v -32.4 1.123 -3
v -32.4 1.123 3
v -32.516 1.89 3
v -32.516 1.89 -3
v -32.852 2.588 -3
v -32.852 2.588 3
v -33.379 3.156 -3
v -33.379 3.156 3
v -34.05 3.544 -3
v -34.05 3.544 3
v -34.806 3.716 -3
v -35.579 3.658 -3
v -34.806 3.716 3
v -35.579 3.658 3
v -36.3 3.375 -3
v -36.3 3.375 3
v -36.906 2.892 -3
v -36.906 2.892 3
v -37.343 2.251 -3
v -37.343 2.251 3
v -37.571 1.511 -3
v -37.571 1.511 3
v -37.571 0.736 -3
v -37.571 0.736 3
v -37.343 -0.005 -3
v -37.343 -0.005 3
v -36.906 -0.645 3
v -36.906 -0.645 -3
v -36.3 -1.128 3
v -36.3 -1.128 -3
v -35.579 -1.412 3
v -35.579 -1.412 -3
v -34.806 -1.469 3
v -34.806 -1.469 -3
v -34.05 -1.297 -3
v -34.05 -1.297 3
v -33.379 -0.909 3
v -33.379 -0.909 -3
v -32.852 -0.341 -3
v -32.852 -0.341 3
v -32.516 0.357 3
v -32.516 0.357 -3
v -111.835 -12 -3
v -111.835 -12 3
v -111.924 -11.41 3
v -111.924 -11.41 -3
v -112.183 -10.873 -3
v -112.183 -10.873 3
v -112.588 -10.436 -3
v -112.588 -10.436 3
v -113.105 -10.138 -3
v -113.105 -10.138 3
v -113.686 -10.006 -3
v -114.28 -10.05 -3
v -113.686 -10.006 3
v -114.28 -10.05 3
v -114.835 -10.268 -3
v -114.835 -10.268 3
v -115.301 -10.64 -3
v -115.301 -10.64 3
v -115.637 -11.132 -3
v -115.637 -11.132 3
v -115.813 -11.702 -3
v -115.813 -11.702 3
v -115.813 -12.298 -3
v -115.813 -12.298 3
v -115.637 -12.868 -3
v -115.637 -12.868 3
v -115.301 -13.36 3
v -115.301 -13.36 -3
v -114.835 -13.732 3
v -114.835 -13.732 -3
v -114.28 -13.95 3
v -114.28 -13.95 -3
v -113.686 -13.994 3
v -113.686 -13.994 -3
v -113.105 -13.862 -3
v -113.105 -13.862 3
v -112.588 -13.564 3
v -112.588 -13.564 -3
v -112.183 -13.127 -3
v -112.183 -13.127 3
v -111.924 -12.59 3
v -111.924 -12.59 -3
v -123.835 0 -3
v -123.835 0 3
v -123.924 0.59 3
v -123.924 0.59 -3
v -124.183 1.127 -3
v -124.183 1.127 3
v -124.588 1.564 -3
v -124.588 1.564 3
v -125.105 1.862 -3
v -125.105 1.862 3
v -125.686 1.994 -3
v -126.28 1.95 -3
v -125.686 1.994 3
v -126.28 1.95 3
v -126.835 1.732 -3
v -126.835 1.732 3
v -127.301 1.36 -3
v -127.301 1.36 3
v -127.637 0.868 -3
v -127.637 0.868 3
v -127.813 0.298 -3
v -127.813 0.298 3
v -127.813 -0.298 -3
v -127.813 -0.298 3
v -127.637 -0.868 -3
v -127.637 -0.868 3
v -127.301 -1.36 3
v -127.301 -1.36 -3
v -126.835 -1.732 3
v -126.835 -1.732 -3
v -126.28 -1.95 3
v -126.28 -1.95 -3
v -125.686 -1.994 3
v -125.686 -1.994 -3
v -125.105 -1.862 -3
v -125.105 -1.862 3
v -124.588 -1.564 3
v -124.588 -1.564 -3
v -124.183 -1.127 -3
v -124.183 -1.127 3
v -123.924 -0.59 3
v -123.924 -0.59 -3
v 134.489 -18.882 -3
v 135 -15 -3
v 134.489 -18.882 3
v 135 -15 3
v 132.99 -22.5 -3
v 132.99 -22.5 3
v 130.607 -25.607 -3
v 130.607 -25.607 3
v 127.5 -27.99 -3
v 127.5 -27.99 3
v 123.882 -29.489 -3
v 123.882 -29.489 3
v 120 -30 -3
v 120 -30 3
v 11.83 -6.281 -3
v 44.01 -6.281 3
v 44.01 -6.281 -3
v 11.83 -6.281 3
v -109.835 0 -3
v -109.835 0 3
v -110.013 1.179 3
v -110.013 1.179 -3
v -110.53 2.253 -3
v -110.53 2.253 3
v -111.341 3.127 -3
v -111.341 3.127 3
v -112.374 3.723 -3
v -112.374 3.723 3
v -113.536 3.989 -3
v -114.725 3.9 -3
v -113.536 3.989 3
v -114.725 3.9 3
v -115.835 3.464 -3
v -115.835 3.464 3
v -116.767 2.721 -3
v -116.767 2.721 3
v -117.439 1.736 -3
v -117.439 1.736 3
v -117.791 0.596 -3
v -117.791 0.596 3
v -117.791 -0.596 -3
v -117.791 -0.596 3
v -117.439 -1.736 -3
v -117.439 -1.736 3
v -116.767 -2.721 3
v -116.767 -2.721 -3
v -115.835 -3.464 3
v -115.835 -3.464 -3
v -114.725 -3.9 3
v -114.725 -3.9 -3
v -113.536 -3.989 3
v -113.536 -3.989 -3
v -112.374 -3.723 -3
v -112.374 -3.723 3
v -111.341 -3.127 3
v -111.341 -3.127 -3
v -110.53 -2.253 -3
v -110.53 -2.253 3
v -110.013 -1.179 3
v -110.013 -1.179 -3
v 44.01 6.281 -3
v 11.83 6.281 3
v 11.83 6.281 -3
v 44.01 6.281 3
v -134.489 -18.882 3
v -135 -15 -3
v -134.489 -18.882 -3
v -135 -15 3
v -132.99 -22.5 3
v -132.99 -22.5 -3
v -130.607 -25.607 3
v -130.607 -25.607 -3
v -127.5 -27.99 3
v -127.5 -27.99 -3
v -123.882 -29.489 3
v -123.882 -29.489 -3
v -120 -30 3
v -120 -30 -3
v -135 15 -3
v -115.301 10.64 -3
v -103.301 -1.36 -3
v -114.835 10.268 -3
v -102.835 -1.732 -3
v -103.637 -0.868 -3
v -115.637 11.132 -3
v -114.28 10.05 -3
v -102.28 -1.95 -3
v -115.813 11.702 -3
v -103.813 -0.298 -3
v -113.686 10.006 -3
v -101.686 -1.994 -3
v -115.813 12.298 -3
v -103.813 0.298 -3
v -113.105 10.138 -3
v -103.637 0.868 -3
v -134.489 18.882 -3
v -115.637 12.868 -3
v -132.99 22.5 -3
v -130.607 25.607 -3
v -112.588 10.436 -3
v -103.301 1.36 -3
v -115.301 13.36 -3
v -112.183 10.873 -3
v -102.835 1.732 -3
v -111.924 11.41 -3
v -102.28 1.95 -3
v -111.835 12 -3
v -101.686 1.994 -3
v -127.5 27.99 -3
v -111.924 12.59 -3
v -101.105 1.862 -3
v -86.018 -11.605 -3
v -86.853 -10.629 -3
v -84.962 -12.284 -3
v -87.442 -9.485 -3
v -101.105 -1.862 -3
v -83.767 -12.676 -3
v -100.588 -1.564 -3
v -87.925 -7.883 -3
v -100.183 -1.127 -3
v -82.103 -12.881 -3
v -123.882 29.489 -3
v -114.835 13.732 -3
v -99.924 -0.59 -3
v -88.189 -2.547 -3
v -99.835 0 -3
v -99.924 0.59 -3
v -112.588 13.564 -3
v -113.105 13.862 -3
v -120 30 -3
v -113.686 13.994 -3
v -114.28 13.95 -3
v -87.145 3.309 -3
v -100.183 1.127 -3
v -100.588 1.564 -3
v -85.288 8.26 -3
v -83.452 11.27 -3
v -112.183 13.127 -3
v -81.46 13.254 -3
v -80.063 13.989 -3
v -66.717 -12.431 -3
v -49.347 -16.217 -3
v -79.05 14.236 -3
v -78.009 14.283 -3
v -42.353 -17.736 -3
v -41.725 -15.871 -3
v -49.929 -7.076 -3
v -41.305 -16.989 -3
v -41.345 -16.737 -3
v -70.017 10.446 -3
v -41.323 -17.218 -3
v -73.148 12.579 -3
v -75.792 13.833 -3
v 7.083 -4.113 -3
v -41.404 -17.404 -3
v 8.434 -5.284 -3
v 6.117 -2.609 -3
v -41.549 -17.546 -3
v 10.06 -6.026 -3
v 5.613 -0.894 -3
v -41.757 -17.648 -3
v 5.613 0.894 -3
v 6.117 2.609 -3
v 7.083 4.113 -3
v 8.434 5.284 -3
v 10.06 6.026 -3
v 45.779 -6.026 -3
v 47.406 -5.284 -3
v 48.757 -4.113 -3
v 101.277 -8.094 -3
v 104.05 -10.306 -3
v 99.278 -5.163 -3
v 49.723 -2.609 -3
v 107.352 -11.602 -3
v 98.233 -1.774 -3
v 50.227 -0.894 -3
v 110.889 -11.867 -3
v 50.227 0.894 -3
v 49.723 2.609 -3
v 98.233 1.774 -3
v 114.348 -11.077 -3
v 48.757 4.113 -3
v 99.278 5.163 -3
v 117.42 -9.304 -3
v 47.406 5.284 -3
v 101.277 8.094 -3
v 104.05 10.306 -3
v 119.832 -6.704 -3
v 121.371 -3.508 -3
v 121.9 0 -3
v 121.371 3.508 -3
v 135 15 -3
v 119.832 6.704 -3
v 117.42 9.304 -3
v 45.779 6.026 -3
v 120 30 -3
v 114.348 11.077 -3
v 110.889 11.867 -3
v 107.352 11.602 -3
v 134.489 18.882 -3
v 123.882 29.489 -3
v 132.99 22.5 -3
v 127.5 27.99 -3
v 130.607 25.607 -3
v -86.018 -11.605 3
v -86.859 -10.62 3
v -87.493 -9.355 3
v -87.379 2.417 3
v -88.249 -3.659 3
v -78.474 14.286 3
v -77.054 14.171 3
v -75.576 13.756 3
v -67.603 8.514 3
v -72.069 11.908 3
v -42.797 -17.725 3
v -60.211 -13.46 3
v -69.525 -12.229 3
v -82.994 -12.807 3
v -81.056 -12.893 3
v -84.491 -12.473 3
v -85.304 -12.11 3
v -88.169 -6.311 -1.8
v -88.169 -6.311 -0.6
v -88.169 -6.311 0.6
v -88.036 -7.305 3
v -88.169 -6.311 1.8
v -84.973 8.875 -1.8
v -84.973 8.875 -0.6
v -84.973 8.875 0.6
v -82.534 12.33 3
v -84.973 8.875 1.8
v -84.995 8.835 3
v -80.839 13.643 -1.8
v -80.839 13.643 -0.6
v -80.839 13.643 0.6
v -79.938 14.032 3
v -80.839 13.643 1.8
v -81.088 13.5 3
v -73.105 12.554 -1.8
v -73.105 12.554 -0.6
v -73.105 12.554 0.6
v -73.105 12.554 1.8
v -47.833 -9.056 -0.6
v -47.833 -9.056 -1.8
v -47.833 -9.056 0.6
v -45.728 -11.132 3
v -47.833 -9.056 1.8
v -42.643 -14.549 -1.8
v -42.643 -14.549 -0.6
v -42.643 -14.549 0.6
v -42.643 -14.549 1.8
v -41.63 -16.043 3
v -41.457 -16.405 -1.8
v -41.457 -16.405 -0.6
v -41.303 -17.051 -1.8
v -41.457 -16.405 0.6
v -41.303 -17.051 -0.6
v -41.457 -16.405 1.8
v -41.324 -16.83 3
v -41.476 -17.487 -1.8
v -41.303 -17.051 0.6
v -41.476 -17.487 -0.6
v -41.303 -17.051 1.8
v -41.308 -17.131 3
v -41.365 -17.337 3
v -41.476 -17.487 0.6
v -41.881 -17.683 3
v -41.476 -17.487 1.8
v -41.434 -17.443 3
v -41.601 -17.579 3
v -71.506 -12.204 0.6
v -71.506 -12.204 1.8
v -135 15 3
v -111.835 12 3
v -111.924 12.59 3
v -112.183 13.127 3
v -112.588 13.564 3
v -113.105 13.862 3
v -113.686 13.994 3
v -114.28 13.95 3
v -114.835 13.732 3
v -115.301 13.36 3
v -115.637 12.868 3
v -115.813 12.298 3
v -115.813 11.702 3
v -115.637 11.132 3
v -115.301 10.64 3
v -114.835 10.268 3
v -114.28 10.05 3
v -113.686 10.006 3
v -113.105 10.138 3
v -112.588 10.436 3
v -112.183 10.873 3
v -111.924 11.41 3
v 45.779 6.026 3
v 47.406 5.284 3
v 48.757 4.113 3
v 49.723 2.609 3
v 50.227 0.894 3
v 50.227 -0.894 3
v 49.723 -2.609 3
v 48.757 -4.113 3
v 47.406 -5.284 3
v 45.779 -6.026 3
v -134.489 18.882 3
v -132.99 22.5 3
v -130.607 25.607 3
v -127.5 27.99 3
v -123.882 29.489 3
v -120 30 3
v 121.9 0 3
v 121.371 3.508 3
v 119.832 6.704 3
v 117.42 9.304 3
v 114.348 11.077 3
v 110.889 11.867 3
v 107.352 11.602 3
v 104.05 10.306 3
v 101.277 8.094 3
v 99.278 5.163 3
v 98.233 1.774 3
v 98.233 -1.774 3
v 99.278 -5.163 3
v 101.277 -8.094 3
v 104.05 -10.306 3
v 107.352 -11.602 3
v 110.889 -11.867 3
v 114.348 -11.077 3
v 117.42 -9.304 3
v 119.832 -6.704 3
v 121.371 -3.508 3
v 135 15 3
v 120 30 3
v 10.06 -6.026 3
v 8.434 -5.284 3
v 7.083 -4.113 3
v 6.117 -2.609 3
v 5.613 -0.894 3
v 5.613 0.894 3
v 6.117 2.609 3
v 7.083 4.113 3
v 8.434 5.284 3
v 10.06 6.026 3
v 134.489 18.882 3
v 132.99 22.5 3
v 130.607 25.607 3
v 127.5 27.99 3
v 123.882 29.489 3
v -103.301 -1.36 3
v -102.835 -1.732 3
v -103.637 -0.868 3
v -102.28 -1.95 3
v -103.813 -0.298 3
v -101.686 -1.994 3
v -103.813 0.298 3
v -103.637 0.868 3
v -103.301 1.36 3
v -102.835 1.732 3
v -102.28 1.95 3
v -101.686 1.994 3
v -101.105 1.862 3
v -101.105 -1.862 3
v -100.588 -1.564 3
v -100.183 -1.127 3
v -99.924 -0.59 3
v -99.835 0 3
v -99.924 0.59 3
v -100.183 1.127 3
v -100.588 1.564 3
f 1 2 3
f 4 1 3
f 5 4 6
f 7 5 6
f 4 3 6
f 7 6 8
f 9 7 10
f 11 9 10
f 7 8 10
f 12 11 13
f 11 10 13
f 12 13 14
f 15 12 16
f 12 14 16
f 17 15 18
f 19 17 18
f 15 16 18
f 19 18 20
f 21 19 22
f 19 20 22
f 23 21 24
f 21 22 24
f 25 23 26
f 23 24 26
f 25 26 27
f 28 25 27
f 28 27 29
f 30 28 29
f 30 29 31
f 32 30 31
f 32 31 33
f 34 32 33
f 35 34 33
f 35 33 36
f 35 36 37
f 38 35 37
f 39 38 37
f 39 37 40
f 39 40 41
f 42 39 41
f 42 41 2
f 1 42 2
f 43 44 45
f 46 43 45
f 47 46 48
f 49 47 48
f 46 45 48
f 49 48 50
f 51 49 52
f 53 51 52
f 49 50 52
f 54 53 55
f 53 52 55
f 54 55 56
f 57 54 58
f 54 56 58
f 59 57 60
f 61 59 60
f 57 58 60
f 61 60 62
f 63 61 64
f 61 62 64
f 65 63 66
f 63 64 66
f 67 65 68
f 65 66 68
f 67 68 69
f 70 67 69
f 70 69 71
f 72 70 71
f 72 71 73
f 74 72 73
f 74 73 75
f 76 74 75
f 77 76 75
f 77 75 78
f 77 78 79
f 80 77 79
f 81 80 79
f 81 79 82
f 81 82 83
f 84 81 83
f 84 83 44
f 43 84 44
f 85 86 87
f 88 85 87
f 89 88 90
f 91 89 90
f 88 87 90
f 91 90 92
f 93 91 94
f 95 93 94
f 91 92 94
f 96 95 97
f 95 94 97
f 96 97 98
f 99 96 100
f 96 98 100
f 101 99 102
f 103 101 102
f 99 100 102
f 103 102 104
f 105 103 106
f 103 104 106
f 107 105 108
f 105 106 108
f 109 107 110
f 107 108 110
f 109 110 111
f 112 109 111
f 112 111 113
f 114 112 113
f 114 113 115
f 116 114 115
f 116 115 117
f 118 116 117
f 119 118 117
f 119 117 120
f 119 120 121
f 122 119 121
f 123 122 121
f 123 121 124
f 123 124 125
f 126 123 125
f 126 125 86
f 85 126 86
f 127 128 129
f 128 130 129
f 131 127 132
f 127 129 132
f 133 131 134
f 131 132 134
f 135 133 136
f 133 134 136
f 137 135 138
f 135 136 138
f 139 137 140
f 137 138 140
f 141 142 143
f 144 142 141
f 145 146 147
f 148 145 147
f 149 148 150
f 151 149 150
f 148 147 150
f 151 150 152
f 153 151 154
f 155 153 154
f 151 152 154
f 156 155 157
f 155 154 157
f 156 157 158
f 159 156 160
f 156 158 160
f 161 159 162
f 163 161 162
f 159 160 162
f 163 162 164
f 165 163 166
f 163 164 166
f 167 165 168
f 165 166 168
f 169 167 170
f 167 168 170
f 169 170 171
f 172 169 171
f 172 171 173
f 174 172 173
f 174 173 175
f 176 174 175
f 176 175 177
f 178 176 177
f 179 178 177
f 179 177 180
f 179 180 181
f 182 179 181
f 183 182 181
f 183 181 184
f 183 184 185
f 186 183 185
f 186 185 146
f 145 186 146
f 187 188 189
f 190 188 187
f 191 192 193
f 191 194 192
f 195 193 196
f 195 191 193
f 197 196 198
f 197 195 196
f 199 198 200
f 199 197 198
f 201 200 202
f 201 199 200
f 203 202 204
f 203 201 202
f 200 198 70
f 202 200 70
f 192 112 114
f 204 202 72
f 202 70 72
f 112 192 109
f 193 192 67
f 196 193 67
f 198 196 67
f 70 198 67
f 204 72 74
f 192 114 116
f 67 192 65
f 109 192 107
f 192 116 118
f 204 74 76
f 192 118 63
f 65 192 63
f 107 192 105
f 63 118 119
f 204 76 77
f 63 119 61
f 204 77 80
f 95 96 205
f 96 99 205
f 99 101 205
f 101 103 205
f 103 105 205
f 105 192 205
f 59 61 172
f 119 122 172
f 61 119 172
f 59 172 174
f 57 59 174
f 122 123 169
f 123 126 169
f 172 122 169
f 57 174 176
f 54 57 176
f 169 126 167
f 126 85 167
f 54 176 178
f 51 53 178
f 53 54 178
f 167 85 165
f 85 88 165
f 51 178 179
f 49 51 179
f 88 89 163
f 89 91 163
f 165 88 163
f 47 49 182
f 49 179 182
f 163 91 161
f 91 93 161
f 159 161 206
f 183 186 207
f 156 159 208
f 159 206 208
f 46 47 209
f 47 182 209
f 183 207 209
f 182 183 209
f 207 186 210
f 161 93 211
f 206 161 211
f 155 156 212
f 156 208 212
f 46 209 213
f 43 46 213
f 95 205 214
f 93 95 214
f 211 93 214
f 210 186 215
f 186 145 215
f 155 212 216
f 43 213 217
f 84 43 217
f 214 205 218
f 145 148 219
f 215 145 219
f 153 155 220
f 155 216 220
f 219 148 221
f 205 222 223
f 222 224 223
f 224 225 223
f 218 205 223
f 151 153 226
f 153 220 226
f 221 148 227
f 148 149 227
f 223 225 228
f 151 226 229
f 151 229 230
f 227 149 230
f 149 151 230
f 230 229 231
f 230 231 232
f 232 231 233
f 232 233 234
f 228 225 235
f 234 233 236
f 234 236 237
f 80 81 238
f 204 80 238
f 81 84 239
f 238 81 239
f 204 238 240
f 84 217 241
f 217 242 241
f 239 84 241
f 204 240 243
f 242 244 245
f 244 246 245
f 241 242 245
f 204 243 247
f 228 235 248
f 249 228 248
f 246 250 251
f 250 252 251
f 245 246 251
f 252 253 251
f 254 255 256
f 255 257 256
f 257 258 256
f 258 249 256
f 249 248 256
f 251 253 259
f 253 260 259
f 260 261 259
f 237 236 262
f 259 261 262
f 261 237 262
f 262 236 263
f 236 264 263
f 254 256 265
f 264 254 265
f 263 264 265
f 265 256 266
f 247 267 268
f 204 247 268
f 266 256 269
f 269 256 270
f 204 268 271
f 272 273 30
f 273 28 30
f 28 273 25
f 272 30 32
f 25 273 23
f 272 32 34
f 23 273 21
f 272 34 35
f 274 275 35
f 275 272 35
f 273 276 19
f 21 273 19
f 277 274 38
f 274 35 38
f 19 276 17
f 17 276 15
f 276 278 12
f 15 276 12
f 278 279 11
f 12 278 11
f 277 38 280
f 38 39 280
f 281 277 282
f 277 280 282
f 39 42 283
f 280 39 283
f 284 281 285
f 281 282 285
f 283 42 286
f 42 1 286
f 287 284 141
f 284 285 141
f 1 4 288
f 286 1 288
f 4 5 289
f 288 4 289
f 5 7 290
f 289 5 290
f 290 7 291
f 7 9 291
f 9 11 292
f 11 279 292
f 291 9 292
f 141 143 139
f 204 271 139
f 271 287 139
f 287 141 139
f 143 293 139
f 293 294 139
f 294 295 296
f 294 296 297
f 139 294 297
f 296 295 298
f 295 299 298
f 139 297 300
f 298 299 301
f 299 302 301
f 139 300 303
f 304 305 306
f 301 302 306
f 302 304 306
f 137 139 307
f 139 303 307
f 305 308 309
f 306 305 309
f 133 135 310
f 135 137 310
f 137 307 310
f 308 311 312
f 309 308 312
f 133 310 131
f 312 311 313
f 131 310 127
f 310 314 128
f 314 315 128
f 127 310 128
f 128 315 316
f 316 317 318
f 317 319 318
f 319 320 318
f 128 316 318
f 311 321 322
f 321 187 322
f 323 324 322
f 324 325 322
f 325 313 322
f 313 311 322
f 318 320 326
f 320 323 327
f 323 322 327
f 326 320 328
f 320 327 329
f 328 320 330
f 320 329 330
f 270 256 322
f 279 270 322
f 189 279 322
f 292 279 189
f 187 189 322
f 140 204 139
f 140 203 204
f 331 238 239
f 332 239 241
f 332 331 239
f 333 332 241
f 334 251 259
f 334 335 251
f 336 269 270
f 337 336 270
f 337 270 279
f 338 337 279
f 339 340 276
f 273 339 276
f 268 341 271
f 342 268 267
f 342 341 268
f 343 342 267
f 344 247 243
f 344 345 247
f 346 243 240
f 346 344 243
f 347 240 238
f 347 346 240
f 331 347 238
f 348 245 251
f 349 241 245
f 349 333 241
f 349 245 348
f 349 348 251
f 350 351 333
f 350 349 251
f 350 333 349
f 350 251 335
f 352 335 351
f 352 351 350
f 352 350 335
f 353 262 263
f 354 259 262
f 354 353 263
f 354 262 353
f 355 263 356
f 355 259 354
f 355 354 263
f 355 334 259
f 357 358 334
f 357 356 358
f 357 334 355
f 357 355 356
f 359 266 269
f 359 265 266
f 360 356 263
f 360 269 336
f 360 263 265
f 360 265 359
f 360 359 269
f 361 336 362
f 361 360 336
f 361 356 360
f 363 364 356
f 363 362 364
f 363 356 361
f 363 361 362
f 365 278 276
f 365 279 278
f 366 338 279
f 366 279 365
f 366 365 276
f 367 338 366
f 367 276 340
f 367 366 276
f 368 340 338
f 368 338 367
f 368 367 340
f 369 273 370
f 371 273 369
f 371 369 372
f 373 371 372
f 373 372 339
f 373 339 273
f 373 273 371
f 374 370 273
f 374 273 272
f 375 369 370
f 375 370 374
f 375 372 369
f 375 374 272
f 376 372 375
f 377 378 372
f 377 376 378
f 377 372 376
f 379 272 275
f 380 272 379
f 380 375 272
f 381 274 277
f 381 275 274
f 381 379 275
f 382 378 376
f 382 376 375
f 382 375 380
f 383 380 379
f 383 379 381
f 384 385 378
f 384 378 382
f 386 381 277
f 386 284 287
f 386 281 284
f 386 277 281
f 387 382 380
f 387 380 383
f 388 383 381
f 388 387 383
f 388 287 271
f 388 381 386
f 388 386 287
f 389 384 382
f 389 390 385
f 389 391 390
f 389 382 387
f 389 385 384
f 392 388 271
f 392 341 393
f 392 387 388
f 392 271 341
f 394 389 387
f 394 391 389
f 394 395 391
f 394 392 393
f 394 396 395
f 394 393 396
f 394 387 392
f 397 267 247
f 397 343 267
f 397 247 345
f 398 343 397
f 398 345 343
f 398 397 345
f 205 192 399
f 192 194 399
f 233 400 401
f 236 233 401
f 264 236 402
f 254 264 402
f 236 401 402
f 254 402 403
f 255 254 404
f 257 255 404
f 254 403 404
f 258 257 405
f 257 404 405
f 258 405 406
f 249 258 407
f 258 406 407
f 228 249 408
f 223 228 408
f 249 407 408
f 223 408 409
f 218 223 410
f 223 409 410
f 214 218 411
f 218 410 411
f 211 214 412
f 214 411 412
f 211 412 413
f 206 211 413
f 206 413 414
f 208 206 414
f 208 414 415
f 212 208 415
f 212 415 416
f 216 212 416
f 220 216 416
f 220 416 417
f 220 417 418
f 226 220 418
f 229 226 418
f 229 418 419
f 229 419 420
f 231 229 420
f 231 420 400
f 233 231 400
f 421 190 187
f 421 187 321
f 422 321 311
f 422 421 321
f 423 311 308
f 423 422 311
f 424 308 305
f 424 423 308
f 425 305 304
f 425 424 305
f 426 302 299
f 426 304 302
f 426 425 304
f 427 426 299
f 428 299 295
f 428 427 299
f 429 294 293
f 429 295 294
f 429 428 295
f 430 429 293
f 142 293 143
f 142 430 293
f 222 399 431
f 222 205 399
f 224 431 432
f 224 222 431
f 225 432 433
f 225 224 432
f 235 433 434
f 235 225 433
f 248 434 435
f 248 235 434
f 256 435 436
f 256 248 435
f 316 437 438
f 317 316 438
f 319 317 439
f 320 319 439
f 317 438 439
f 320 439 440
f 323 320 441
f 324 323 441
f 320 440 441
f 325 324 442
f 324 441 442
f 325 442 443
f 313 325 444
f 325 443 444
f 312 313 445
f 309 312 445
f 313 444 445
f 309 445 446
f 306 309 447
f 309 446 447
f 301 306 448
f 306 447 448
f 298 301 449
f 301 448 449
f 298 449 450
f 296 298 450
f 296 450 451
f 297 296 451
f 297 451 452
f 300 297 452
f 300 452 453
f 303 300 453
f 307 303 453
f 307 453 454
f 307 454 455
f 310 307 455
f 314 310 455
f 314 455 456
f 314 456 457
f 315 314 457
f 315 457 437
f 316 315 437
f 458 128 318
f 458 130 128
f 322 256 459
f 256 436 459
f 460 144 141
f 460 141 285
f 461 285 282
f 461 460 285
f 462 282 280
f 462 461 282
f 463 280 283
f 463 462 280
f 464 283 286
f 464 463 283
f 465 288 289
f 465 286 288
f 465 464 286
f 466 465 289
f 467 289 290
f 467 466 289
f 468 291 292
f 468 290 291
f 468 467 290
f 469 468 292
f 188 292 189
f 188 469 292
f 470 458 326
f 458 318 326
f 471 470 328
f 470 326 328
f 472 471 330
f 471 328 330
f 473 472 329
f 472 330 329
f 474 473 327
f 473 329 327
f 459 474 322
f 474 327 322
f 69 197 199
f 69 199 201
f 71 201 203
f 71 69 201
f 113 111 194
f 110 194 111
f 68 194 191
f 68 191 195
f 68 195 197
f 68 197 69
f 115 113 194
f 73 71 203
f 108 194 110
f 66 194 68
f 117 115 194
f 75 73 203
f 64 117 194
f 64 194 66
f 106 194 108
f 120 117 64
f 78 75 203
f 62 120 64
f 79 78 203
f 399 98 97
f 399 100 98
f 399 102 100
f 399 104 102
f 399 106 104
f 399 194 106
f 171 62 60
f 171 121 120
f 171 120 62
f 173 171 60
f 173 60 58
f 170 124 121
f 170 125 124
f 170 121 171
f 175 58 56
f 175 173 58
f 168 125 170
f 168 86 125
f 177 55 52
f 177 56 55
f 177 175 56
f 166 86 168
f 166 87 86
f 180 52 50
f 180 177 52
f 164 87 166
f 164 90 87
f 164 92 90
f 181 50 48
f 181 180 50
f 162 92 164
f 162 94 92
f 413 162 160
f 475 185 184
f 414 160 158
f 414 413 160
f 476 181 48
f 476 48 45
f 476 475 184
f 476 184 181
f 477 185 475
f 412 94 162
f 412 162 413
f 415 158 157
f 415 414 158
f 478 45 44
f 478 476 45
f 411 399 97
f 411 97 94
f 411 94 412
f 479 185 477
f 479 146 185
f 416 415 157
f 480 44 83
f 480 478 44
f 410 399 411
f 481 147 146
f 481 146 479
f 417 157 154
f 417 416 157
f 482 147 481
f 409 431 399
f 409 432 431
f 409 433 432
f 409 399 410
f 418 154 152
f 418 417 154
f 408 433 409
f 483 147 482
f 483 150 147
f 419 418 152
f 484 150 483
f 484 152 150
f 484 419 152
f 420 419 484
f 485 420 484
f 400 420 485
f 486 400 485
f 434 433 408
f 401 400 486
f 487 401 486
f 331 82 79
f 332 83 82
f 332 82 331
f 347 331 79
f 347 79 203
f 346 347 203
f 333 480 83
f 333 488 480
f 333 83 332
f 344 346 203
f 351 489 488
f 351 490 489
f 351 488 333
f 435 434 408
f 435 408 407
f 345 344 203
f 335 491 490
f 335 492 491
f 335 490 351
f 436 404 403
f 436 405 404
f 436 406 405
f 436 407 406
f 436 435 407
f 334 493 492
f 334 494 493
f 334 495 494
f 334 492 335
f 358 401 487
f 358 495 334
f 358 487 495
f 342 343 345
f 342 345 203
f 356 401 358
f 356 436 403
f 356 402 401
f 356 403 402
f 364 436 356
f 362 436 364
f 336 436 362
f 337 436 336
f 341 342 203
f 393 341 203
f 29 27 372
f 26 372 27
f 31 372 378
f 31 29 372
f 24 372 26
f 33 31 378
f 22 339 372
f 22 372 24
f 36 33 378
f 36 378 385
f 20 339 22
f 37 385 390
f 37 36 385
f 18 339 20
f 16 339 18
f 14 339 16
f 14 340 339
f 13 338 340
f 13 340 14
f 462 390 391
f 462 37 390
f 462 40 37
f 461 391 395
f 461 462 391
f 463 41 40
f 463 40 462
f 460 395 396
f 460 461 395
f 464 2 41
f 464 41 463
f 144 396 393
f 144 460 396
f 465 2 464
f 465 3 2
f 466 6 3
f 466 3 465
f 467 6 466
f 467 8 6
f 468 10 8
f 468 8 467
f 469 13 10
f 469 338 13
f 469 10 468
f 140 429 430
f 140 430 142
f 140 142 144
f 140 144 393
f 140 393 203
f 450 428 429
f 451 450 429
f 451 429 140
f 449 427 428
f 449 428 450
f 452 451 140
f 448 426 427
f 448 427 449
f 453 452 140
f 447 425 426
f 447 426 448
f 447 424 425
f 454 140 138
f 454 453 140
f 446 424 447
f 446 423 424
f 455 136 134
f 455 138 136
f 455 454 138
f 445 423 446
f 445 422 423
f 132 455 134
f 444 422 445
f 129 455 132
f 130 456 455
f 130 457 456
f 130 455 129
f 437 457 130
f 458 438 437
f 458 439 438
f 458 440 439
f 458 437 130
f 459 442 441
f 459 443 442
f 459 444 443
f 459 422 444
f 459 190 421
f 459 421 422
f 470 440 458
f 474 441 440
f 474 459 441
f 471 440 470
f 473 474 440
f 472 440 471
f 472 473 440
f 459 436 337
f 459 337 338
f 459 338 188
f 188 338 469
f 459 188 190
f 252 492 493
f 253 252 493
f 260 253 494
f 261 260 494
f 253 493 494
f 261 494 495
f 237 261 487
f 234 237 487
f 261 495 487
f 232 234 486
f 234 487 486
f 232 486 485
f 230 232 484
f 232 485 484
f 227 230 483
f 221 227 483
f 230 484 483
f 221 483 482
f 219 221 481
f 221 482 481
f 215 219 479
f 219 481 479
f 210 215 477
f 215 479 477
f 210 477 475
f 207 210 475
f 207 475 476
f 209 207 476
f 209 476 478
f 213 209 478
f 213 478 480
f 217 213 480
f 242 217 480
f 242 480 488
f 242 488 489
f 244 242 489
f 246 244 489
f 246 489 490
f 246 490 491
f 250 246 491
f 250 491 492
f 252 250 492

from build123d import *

# Parameters (mm, degrees)
SKETCH1_W           = 270
SKETCH1_H           = 60
BOSS_EXTRUDE1_DEPTH = 3
FILLET1_R           = 15
SKETCH3_R           = 4
SKETCH3_R_2         = 2
CUT_EXTRUDE1_DEPTH  = 8
SKETCH4_R           = 2.6
SKETCH4_R_2         = 11.9
CUT_EXTRUDE2_DEPTH  = 10
CUT_EXTRUDE3_DEPTH  = 10


with BuildPart() as part:
    # Sketch1 → Boss-Extrude1 (new, symmetric)
    with BuildSketch(Plane.XY):
        Rectangle(SKETCH1_W, SKETCH1_H)
    extrude(amount=BOSS_EXTRUDE1_DEPTH, both=True)

    # Fillet1
    fillet1_edges = [part.edges().sort_by_distance(p)[0] for p in [
        (135, -30, 0),
        (-135, -30, 0),
        (-135, 30, 0),
        (135, 30, 0),
    ]]
    fillet(fillet1_edges, radius=FILLET1_R)

    # Sketch3 → Cut-Extrude1 (cut)
    with BuildSketch(Plane.XY.offset(3)):
        with Locations((-113.835271993, 0)):
            Circle(SKETCH3_R)
        with Locations((-113.835271993, 12)):
            Circle(SKETCH3_R_2)
        with Locations((-113.835271993, -12)):
            Circle(SKETCH3_R_2)
        with Locations((-101.835271993, 0)):
            Circle(SKETCH3_R_2)
        with Locations((-125.835271993, 0)):
            Circle(SKETCH3_R_2)
    extrude(amount=-CUT_EXTRUDE1_DEPTH, mode=Mode.SUBTRACT)

    # Sketch4 → Cut-Extrude2 (cut)
    with BuildSketch(Plane.XY.offset(3)):
        with Locations((-35, 1.123266966)):
            Circle(SKETCH4_R)
        with Locations((110, 0)):
            Circle(SKETCH4_R_2)
    extrude(amount=-CUT_EXTRUDE2_DEPTH, mode=Mode.SUBTRACT)

    # Sketch5 → Cut-Extrude3 (cut)
    with BuildSketch(Plane.XY.offset(3)):
        with BuildLine():
            add(Edge.make_bspline(
                [(-86.01823318, -11.605280405), (-90.956175865, -7.27604283), (-84.22937534, 23.092684909), (-60.562452564, 2.39071625), (-27.099149372, -26.622988945), (-65.929752728, -8.617700677), (-83.23545088, -14.045026362), (-86.01823318, -11.605280405)],
                knots=[0, 0, 0, 0, 0.211868543, 0.367136428, 0.629956713, 0.880601281, 1, 1, 1, 1], degree=3))
        make_face()
        with BuildLine():
            Line((11.82961063, 6.280531647), (44.0100176, 6.280531647))
            ThreePointArc((44.0100176, 6.280531647), (50.290549247, 0), (44.0100176, -6.280531647))
            Line((44.0100176, -6.280531647), (11.82961063, -6.280531647))
            ThreePointArc((11.82961063, -6.280531647), (5.549078983, 0), (11.82961063, 6.280531647))
        make_face()
    extrude(amount=-CUT_EXTRUDE3_DEPTH, mode=Mode.SUBTRACT)


solid = part.part
